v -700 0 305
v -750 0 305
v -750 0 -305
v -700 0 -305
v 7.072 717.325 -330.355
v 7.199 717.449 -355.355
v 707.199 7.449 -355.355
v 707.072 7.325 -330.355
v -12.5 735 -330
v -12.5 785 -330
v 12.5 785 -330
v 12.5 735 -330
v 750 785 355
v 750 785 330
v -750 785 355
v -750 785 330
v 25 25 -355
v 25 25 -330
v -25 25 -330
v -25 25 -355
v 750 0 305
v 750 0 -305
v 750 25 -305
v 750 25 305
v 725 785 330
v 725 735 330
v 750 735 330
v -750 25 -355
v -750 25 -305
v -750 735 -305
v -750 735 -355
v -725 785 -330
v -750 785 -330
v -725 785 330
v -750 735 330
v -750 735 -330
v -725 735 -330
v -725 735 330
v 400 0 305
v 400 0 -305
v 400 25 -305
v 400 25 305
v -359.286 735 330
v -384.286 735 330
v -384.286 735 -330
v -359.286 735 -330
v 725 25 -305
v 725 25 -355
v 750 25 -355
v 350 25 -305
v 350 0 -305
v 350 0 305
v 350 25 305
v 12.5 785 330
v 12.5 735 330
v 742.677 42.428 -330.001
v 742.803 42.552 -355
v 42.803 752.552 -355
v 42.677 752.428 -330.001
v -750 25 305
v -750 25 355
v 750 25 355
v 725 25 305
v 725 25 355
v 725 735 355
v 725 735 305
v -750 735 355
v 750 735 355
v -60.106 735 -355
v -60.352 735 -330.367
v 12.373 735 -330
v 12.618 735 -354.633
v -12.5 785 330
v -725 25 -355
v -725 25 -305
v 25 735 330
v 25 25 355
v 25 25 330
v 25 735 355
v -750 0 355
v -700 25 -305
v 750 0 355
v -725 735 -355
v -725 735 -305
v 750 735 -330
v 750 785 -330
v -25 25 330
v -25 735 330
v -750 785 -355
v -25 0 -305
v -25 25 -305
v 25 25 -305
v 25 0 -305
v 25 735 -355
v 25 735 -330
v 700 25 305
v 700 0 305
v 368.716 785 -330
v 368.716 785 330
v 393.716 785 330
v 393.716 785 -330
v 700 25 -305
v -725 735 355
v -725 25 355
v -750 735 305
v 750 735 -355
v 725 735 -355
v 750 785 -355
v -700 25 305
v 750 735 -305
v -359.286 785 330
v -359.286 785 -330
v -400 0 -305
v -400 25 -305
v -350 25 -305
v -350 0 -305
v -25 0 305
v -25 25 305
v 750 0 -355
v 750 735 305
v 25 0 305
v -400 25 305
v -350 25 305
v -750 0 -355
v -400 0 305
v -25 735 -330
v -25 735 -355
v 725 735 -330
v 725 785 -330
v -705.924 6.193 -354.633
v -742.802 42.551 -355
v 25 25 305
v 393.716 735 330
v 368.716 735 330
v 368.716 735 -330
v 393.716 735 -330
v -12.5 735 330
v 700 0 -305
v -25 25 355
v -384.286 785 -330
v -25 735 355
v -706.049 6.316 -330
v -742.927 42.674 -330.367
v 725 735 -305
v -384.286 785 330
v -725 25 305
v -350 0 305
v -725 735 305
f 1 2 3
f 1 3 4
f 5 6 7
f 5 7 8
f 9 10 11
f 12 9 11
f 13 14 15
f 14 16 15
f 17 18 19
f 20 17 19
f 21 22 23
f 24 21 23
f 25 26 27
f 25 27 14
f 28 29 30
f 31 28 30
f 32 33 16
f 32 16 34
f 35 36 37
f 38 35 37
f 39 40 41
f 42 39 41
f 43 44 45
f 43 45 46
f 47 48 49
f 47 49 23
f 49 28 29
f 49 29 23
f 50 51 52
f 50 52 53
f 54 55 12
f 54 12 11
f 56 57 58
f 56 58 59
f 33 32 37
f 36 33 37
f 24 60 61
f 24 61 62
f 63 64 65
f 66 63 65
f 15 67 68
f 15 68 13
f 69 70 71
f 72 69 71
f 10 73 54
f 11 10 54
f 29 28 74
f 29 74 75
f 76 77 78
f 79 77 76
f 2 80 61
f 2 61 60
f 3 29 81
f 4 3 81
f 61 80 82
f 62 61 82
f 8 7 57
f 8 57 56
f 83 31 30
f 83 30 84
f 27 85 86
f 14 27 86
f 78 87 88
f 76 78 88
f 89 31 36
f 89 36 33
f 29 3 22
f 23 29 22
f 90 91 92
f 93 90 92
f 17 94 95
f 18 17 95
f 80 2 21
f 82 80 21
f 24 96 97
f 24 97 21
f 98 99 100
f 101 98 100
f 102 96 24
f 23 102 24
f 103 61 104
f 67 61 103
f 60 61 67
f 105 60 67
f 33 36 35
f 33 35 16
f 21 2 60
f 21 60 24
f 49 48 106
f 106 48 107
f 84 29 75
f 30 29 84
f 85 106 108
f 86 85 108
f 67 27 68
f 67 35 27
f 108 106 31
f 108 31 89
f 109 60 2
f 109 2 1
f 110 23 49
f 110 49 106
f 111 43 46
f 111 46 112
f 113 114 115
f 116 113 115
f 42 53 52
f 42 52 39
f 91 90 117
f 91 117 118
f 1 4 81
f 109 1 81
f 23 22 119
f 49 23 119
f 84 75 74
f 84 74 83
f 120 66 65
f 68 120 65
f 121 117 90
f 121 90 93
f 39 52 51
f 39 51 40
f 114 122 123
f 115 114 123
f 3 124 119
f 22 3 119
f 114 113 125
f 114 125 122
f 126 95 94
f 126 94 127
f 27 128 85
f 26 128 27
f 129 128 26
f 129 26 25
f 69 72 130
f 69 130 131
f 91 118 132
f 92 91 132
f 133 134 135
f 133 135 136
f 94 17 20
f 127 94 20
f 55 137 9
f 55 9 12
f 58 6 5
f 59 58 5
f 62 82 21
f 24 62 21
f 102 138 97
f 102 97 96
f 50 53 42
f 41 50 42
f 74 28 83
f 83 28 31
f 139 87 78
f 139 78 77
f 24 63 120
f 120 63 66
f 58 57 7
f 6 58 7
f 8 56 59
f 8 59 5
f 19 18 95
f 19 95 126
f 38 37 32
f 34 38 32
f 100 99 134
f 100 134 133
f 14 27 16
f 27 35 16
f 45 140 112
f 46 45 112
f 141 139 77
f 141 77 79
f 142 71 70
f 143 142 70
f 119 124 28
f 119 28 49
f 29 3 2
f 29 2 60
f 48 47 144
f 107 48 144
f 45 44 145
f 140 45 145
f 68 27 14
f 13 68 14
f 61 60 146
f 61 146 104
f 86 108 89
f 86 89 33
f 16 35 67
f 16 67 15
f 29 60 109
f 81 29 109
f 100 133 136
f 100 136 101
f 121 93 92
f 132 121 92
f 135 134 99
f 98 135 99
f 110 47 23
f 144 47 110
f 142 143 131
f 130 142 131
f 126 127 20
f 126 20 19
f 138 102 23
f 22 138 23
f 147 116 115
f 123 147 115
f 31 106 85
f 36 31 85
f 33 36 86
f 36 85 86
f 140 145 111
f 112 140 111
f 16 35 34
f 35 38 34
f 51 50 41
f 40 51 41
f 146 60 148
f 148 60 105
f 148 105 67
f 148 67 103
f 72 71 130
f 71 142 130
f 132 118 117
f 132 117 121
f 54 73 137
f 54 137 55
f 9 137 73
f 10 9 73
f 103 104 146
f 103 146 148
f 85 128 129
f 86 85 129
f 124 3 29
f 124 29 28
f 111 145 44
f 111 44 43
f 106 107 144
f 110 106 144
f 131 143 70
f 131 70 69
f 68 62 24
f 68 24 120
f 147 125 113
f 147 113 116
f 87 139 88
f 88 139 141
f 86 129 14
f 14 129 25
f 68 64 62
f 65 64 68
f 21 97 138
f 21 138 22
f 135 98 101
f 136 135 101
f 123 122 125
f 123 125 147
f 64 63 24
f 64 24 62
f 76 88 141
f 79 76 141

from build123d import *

# Parameters (mm, degrees)
SQUARE_RODS_SQUARE_BAR_50_1_OUTLINE_W          = 1500
SQUARE_RODS_SQUARE_BAR_50_1_OUTLINE_H          = 50
SQUARE_RODS_SQUARE_BAR_50_1_DEPTH              = 25
SQUARE_RODS_START                              = 725
SQUARE_RODS_SQUARE_BAR_50_1_2_OUTLINE_W        = 710
SQUARE_RODS_SQUARE_BAR_50_1_2_OUTLINE_H        = 50
SQUARE_RODS_SQUARE_BAR_50_1_2_DEPTH            = 25
SQUARE_RODS_SQUARE_BAR_50_1_3_OUTLINE_W        = 1500
SQUARE_RODS_SQUARE_BAR_50_1_3_OUTLINE_H        = 50
SQUARE_RODS_SQUARE_BAR_50_1_3_DEPTH            = 25
SQUARE_RODS_SQUARE_BAR_50_1_4_OUTLINE_W        = 710
SQUARE_RODS_SQUARE_BAR_50_1_4_OUTLINE_H        = 50
SQUARE_RODS_SQUARE_BAR_50_1_4_DEPTH            = 25
SQUARE_RODS_START_2                            = -305
SQUARE_RODS_SQUARE_BAR_50_1_5_OUTLINE_W        = 50
SQUARE_RODS_SQUARE_BAR_50_1_5_OUTLINE_H        = 25
SQUARE_RODS_SQUARE_BAR_50_1_5_DEPTH            = 610
SQUARE_RODS_SQUARE_BAR_50_1_6_OUTLINE_W        = 50
SQUARE_RODS_SQUARE_BAR_50_1_6_OUTLINE_H        = 25
SQUARE_RODS_SQUARE_BAR_50_1_6_DEPTH            = 610
SQUARE_RODS_START_3                            = -25
SQUARE_RODS_SQUARE_BAR_50_1_7_OUTLINE_W        = 710
SQUARE_RODS_SQUARE_BAR_50_1_7_OUTLINE_H        = 25
SQUARE_RODS_SQUARE_BAR_50_1_7_DEPTH            = 50
SQUARE_RODS_SQUARE_BAR_50_1_8_OUTLINE_W        = 50
SQUARE_RODS_SQUARE_BAR_50_1_8_OUTLINE_H        = 25
SQUARE_RODS_SQUARE_BAR_50_1_8_DEPTH            = 610
SQUARE_RODS_START_4                            = -750
SQUARE_RODS_SQUARE_BAR_50_1_9_OUTLINE_W        = 735
SQUARE_RODS_SQUARE_BAR_50_1_9_OUTLINE_H        = 50
SQUARE_RODS_SQUARE_BAR_50_1_9_DEPTH            = 25
SQUARE_RODS_SQUARE_BAR_50_1_10_OUTLINE_W       = 735
SQUARE_RODS_SQUARE_BAR_50_1_10_OUTLINE_H       = 50
SQUARE_RODS_SQUARE_BAR_50_1_10_DEPTH           = 25
SQUARE_RODS_START_5                            = -355
SQUARE_RODS_SQUARE_BAR_50_1_11_OUTLINE_W       = 1450
SQUARE_RODS_SQUARE_BAR_50_1_11_OUTLINE_H       = 50
SQUARE_RODS_SQUARE_BAR_50_1_11_DEPTH           = 25
SQUARE_RODS_SQUARE_BAR_50_1_12_OUTLINE_W       = 50
SQUARE_RODS_SQUARE_BAR_50_1_12_OUTLINE_H       = 660
SQUARE_RODS_SQUARE_BAR_50_1_12_DEPTH           = 25
SQUARE_RODS_SQUARE_BAR_50_1_13_OUTLINE_W       = 25
SQUARE_RODS_SQUARE_BAR_50_1_13_OUTLINE_H       = 50
SQUARE_RODS_SQUARE_BAR_50_1_13_DEPTH           = 610
SQUARE_RODS_START_6                            = 330
SQUARE_RODS_SQUARE_BAR_50_1_14_OUTLINE_W       = 1450
SQUARE_RODS_SQUARE_BAR_50_1_14_OUTLINE_H       = 50
SQUARE_RODS_SQUARE_BAR_50_1_14_DEPTH           = 25
SKETCH57_W                                     = 50
SKETCH57_H                                     = 25
AL_TUBE_RECTANGULAR_AL_TUBE_2_X_1_RECT_X_DEPTH = 610
SKETCH59_W                                     = 50
SKETCH59_H                                     = 25
AL_TUBE_RECTANGULAR_AL_TUBE_2_X_1_RE_2_DEPTH   = 610
SKETCH61_W                                     = 50
SKETCH61_H                                     = 25
AL_TUBE_RECTANGULAR_AL_TUBE_2_X_1_RE_3_DEPTH   = 710
SKETCH63_W                                     = 25
SKETCH63_H                                     = 50
AL_TUBE_RECTANGULAR_AL_TUBE_2_X_1_RE_4_DEPTH   = 660
SKETCH63_ON_SEGMENT_2_W                        = 25
SKETCH63_ON_SEGMENT_2_H                        = 50
AL_TUBE_RECTANGULAR_AL_TUBE_2_X_1_RE_4_2_DEPTH = 660
SKETCH63_ON_SEGMENT_3_W                        = 25
SKETCH63_ON_SEGMENT_3_H                        = 50
AL_TUBE_RECTANGULAR_AL_TUBE_2_X_1_RE_4_3_DEPTH = 660
SKETCH67_W                                     = 24.633334571
SKETCH67_H                                     = 51.788476831
AL_TUBE_RECTANGULAR_AL_TUBE_2_X_1_RE_5_DEPTH   = 997.045635866
SKETCH69_W                                     = 25
SKETCH69_H                                     = 50
AL_TUBE_RECTANGULAR_AL_TUBE_2_X_1_RE_6_DEPTH   = 997.045635866
BODY_START                                     = 305
BODY_13_RUN_ON_DEPTH                           = 50
TRIM_EXTEND1_EXTEND_2_RUN_ON                   = 25
TRIM_EXTEND2_EXTEND_2_RUN_ON                   = 25
TRIM_EXTEND3_EXTEND_2_RUN_ON                   = 25
BODY_START_2                                   = -305
BODY_13_RUN_ON_2_DEPTH                         = 50
TRIM_EXTEND4_EXTEND_2_RUN_ON                   = 25
TRIM_EXTEND6_START                             = 735
TRIM_EXTEND6_OUTLINE_W                         = 25
TRIM_EXTEND6_OUTLINE_H                         = 50
TRIM_EXTEND6_DEPTH                             = 25
TRIM_EXTEND9_START                             = 735
TRIM_EXTEND9_OUTLINE_W                         = 25
TRIM_EXTEND9_OUTLINE_H                         = 50
TRIM_EXTEND9_DEPTH                             = 25
BODY_START_3                                   = 997.045636043
BODY_21_RUN_ON_DEPTH                           = 26.41051


# Read off the part's stored shape, not the designer's step: Square-rods SQUARE BAR 50(1), Trim/Extend6, Trim/Extend9
with BuildPart() as part:
    # Square-rods SQUARE BAR 50(1) outline → Square-rods SQUARE BAR 50(1) (new body)
    with BuildSketch(Plane(origin=(0, 0, 0), x_dir=(1, 0, 0), z_dir=(0, 1, 0))):
        with Locations((0, -330)):
            Rectangle(SQUARE_RODS_SQUARE_BAR_50_1_OUTLINE_W, SQUARE_RODS_SQUARE_BAR_50_1_OUTLINE_H)
    extrude(amount=SQUARE_RODS_SQUARE_BAR_50_1_DEPTH)


with BuildPart() as body_2:
    # Square-rods SQUARE BAR 50_1 2 outline → Square-rods SQUARE BAR 50_1 2 (new body)
    with BuildSketch(Plane.YZ.offset(SQUARE_RODS_START)):
        with Locations((380, 330)):
            Rectangle(SQUARE_RODS_SQUARE_BAR_50_1_2_OUTLINE_W, SQUARE_RODS_SQUARE_BAR_50_1_2_OUTLINE_H)
    extrude(amount=SQUARE_RODS_SQUARE_BAR_50_1_2_DEPTH)


with BuildPart() as body_3:
    # Square-rods SQUARE BAR 50_1 3 outline → Square-rods SQUARE BAR 50_1 3 (new body)
    with BuildSketch(Plane(origin=(0, 0, 0), x_dir=(1, 0, 0), z_dir=(0, 1, 0))):
        with Locations((0, 330)):
            Rectangle(SQUARE_RODS_SQUARE_BAR_50_1_3_OUTLINE_W, SQUARE_RODS_SQUARE_BAR_50_1_3_OUTLINE_H)
    extrude(amount=SQUARE_RODS_SQUARE_BAR_50_1_3_DEPTH)


with BuildPart() as body_4:
    # Square-rods SQUARE BAR 50_1 4 outline → Square-rods SQUARE BAR 50_1 4 (new body)
    with BuildSketch(Plane.YZ.offset(SQUARE_RODS_START)):
        with Locations((380, -330)):
            Rectangle(SQUARE_RODS_SQUARE_BAR_50_1_4_OUTLINE_W, SQUARE_RODS_SQUARE_BAR_50_1_4_OUTLINE_H)
    extrude(amount=SQUARE_RODS_SQUARE_BAR_50_1_4_DEPTH)


with BuildPart() as body_5:
    # Square-rods SQUARE BAR 50_1 5 outline → Square-rods SQUARE BAR 50_1 5 (new body)
    with BuildSketch(Plane.XY.offset(SQUARE_RODS_START_2)):
        with Locations((-375, 12.5)):
            Rectangle(SQUARE_RODS_SQUARE_BAR_50_1_5_OUTLINE_W, SQUARE_RODS_SQUARE_BAR_50_1_5_OUTLINE_H)
    extrude(amount=SQUARE_RODS_SQUARE_BAR_50_1_5_DEPTH)


with BuildPart() as body_6:
    # Square-rods SQUARE BAR 50_1 6 outline → Square-rods SQUARE BAR 50_1 6 (new body)
    with BuildSketch(Plane.XY.offset(SQUARE_RODS_START_2)):
        with Locations((0, 12.5)):
            Rectangle(SQUARE_RODS_SQUARE_BAR_50_1_6_OUTLINE_W, SQUARE_RODS_SQUARE_BAR_50_1_6_OUTLINE_H)
    extrude(amount=SQUARE_RODS_SQUARE_BAR_50_1_6_DEPTH)


with BuildPart() as body_7:
    # Square-rods SQUARE BAR 50_1 7 outline → Square-rods SQUARE BAR 50_1 7 (new body)
    with BuildSketch(Plane.YZ.offset(SQUARE_RODS_START_3)):
        with Locations((380, 342.5)):
            Rectangle(SQUARE_RODS_SQUARE_BAR_50_1_7_OUTLINE_W, SQUARE_RODS_SQUARE_BAR_50_1_7_OUTLINE_H)
    extrude(amount=SQUARE_RODS_SQUARE_BAR_50_1_7_DEPTH)


with BuildPart() as body_8:
    # Square-rods SQUARE BAR 50_1 8 outline → Square-rods SQUARE BAR 50_1 8 (new body)
    with BuildSketch(Plane.XY.offset(SQUARE_RODS_START_2)):
        with Locations((375, 12.5)):
            Rectangle(SQUARE_RODS_SQUARE_BAR_50_1_8_OUTLINE_W, SQUARE_RODS_SQUARE_BAR_50_1_8_OUTLINE_H)
    extrude(amount=SQUARE_RODS_SQUARE_BAR_50_1_8_DEPTH)


with BuildPart() as body_9:
    # Square-rods SQUARE BAR 50_1 9 outline → Square-rods SQUARE BAR 50_1 9 (new body)
    with BuildSketch(Plane.YZ.offset(SQUARE_RODS_START_4)):
        with Locations((392.5, -330)):
            Rectangle(SQUARE_RODS_SQUARE_BAR_50_1_9_OUTLINE_W, SQUARE_RODS_SQUARE_BAR_50_1_9_OUTLINE_H)
    extrude(amount=SQUARE_RODS_SQUARE_BAR_50_1_9_DEPTH)

    # Trim/Extend9 outline → Trim/Extend9 (cut)
    with BuildSketch(Plane(origin=(0, 0, 0), x_dir=(1, 0, 0), z_dir=(0, 1, 0)).offset(TRIM_EXTEND9_START)):
        with Locations((-737.5, 330)):
            Rectangle(TRIM_EXTEND9_OUTLINE_W, TRIM_EXTEND9_OUTLINE_H)
    extrude(amount=TRIM_EXTEND9_DEPTH, mode=Mode.SUBTRACT)


with BuildPart() as body_10:
    # Square-rods SQUARE BAR 50_1 10 outline → Square-rods SQUARE BAR 50_1 10 (new body)
    with BuildSketch(Plane.YZ.offset(SQUARE_RODS_START_4)):
        with Locations((392.5, 330)):
            Rectangle(SQUARE_RODS_SQUARE_BAR_50_1_10_OUTLINE_W, SQUARE_RODS_SQUARE_BAR_50_1_10_OUTLINE_H)
    extrude(amount=SQUARE_RODS_SQUARE_BAR_50_1_10_DEPTH)

    # Trim/Extend6 outline → Trim/Extend6 (cut)
    with BuildSketch(Plane(origin=(0, 0, 0), x_dir=(1, 0, 0), z_dir=(0, 1, 0)).offset(TRIM_EXTEND6_START)):
        with Locations((-737.5, -330)):
            Rectangle(TRIM_EXTEND6_OUTLINE_W, TRIM_EXTEND6_OUTLINE_H)
    extrude(amount=TRIM_EXTEND6_DEPTH, mode=Mode.SUBTRACT)


with BuildPart() as body_11:
    # Square-rods SQUARE BAR 50_1 11 outline → Square-rods SQUARE BAR 50_1 11 (new body)
    with BuildSketch(Plane.XY.offset(SQUARE_RODS_START_5)):
        with Locations((0, 760)):
            Rectangle(SQUARE_RODS_SQUARE_BAR_50_1_11_OUTLINE_W, SQUARE_RODS_SQUARE_BAR_50_1_11_OUTLINE_H)
    extrude(amount=SQUARE_RODS_SQUARE_BAR_50_1_11_DEPTH)

    # Trim/Extend3 extend 2: the member runs on so that the trim can cut it back to the boundary (SolidWorks' 'allow extension')
    extrude(body_11.faces().sort_by_distance((725, 760, -342.5))[0], amount=TRIM_EXTEND3_EXTEND_2_RUN_ON, dir=(1, 0, 0))

    # Trim/Extend4 extend 2: the member runs on so that the trim can cut it back to the boundary (SolidWorks' 'allow extension')
    extrude(body_11.faces().sort_by_distance((-725, 760, -342.5))[0], amount=TRIM_EXTEND4_EXTEND_2_RUN_ON, dir=(-1, 0, 0))


with BuildPart() as body_12:
    # Square-rods SQUARE BAR 50_1 12 outline → Square-rods SQUARE BAR 50_1 12 (new body)
    with BuildSketch(Plane.YZ.offset(SQUARE_RODS_START)):
        with Locations((760, 0)):
            Rectangle(SQUARE_RODS_SQUARE_BAR_50_1_12_OUTLINE_W, SQUARE_RODS_SQUARE_BAR_50_1_12_OUTLINE_H)
    extrude(amount=SQUARE_RODS_SQUARE_BAR_50_1_12_DEPTH)


with BuildPart() as body_13:
    # Square-rods SQUARE BAR 50_1 13 outline → Square-rods SQUARE BAR 50_1 13 (new body)
    with BuildSketch(Plane.XY.offset(SQUARE_RODS_START_2)):
        with Locations((-737.5, 760)):
            Rectangle(SQUARE_RODS_SQUARE_BAR_50_1_13_OUTLINE_W, SQUARE_RODS_SQUARE_BAR_50_1_13_OUTLINE_H)
    extrude(amount=SQUARE_RODS_SQUARE_BAR_50_1_13_DEPTH)

    # Square-rods SQUARE BAR 50_1 13 outline → body 13 run on (add)
    with BuildSketch(Plane.XY.offset(BODY_START)):
        with Locations((-737.5, 760)):
            Rectangle(SQUARE_RODS_SQUARE_BAR_50_1_13_OUTLINE_W, SQUARE_RODS_SQUARE_BAR_50_1_13_OUTLINE_H)
    extrude(amount=BODY_13_RUN_ON_DEPTH)

    # Trim/Extend1
    split(bisect_by=Plane(origin=(0, 760, 330), x_dir=(0, 1, 0), z_dir=(0, 0, -1)), keep=Keep.TOP)

    # Square-rods SQUARE BAR 50_1 13 outline → body 13 run on 2 (add)
    with BuildSketch(Plane.XY.offset(BODY_START_2)):
        with Locations((-737.5, 760)):
            Rectangle(SQUARE_RODS_SQUARE_BAR_50_1_13_OUTLINE_W, SQUARE_RODS_SQUARE_BAR_50_1_13_OUTLINE_H)
    extrude(amount=-BODY_13_RUN_ON_2_DEPTH)

    # Trim_Extend4 3
    split(bisect_by=Plane(origin=(12.5, 760, -330), x_dir=(0, -1, 0), z_dir=(0, 0, 1)), keep=Keep.TOP)


with BuildPart() as body_14:
    # Square-rods SQUARE BAR 50_1 14 outline → Square-rods SQUARE BAR 50_1 14 (new body)
    with BuildSketch(Plane.XY.offset(SQUARE_RODS_START_6)):
        with Locations((0, 760)):
            Rectangle(SQUARE_RODS_SQUARE_BAR_50_1_14_OUTLINE_W, SQUARE_RODS_SQUARE_BAR_50_1_14_OUTLINE_H)
    extrude(amount=SQUARE_RODS_SQUARE_BAR_50_1_14_DEPTH)

    # Trim/Extend1 extend 2: the member runs on so that the trim can cut it back to the boundary (SolidWorks' 'allow extension')
    extrude(body_14.faces().sort_by_distance((-725, 760, 342.5))[0], amount=TRIM_EXTEND1_EXTEND_2_RUN_ON, dir=(-1, 0, 0))

    # Trim/Extend2 extend 2: the member runs on so that the trim can cut it back to the boundary (SolidWorks' 'allow extension')
    extrude(body_14.faces().sort_by_distance((725, 760, 342.5))[0], amount=TRIM_EXTEND2_EXTEND_2_RUN_ON, dir=(1, 0, 0))


with BuildPart() as body_15:
    # Sketch57 → Al tube rectangular AL TUBE 2 X 1 RECT X (new body)
    with BuildSketch(Plane(origin=(-750, 0, -305), x_dir=(1, 0, 0), z_dir=(0, 0, 1))):
        with Locations((25, 12.5)):
            Rectangle(SKETCH57_W, SKETCH57_H)
    extrude(amount=AL_TUBE_RECTANGULAR_AL_TUBE_2_X_1_RECT_X_DEPTH)


with BuildPart() as body_16:
    # Sketch59 → Al tube rectangular AL TUBE 2 X 1 RE 2 (new body)
    with BuildSketch(Plane(origin=(750, 0, -305), x_dir=(1, 0, 0), z_dir=(0, 0, 1))):
        with Locations((-25, 12.5)):
            Rectangle(SKETCH59_W, SKETCH59_H)
    extrude(amount=AL_TUBE_RECTANGULAR_AL_TUBE_2_X_1_RE_2_DEPTH)


with BuildPart() as body_17:
    # Sketch61 → Al tube rectangular AL TUBE 2 X 1 RE 3 (new body)
    with BuildSketch(Plane(origin=(0, 25, -355), x_dir=(-1, 0, 0), z_dir=(0, 1, 0))):
        with Locations((0, 12.5)):
            Rectangle(SKETCH61_W, SKETCH61_H)
    extrude(amount=AL_TUBE_RECTANGULAR_AL_TUBE_2_X_1_RE_3_DEPTH)


with BuildPart() as body_18:
    # Sketch63 → Al tube rectangular AL TUBE 2 X 1 RE 4 (new body)
    with BuildSketch(Plane(origin=(-371.786171595, 785, -330), x_dir=(1, 0, 0), z_dir=(0, 0, 1))):
        with Locations((0, -25)):
            Rectangle(SKETCH63_W, SKETCH63_H)
    extrude(amount=AL_TUBE_RECTANGULAR_AL_TUBE_2_X_1_RE_4_DEPTH)


with BuildPart() as body_19:
    # Sketch63 on segment 2 (carried to segment 2) → Al tube rectangular AL TUBE 2 X 1 RE 4 2 (new body)
    with BuildSketch(Plane(origin=(0, 785, -330), x_dir=(1, 0, 0), z_dir=(0, 0, 1))):
        with Locations((0, -25)):
            Rectangle(SKETCH63_ON_SEGMENT_2_W, SKETCH63_ON_SEGMENT_2_H)
    extrude(amount=AL_TUBE_RECTANGULAR_AL_TUBE_2_X_1_RE_4_2_DEPTH)


with BuildPart() as body_20:
    # Sketch63 on segment 3 (carried to segment 3) → Al tube rectangular AL TUBE 2 X 1 RE 4 3 (new body)
    with BuildSketch(Plane(origin=(381.216289359, 785, -330), x_dir=(1, 0, 0), z_dir=(0, 0, 1))):
        with Locations((0, -25)):
            Rectangle(SKETCH63_ON_SEGMENT_3_W, SKETCH63_ON_SEGMENT_3_H)
    extrude(amount=AL_TUBE_RECTANGULAR_AL_TUBE_2_X_1_RE_4_3_DEPTH)


with BuildPart() as body_21:
    # Sketch67 → Al tube rectangular AL TUBE 2 X 1 RE 5 (new body)
    with BuildSketch(Plane(origin=(-725, 25, -355), x_dir=(0.005050254648851948, -0.0049791243016836795, -0.9999748513083568), z_dir=(0.7020741827848287, 0.7121038139674686, 0))):
        with Locations((-12.493963332, -0.895495835)):
            Rectangle(SKETCH67_W, SKETCH67_H)
    extrude(amount=AL_TUBE_RECTANGULAR_AL_TUBE_2_X_1_RE_5_DEPTH)

    # Sketch67 → body 21 run on (add)
    with BuildSketch(Plane(origin=(-725, 25, -355), x_dir=(0.005050254648851948, -0.0049791243016836795, -0.9999748513083568), z_dir=(0.7020741827848287, 0.7121038139674686, 0)).offset(BODY_START_3)):
        with Locations((-12.493963332, -0.895495835)):
            Rectangle(SKETCH67_W, SKETCH67_H)
    extrude(amount=BODY_21_RUN_ON_DEPTH)

    # Trim/Extend10
    split(bisect_by=Plane(origin=(0, 735, -342.5), x_dir=(1, 0, 0), z_dir=(0, -1, 0)), keep=Keep.TOP)


with BuildPart() as body_22:
    # Sketch69 → Al tube rectangular AL TUBE 2 X 1 RE 6 (new body)
    with BuildSketch(Plane(origin=(25, 735, -355), x_dir=(-0.005050254648856833, -0.004979124301689175, 0.9999748513083568), z_dir=(0.7020741827848284, -0.7121038139674688, 0))):
        with Locations((12.322695953, 0.000129408)):
            Rectangle(SKETCH69_W, SKETCH69_H)
    extrude(amount=AL_TUBE_RECTANGULAR_AL_TUBE_2_X_1_RE_6_DEPTH)


solid = Compound([part.part, body_2.part, body_3.part, body_4.part, body_5.part, body_6.part, body_7.part, body_8.part, body_9.part, body_10.part, body_11.part, body_12.part, body_13.part, body_14.part, body_15.part, body_16.part, body_17.part, body_18.part, body_19.part, body_20.part, body_21.part, body_22.part])
